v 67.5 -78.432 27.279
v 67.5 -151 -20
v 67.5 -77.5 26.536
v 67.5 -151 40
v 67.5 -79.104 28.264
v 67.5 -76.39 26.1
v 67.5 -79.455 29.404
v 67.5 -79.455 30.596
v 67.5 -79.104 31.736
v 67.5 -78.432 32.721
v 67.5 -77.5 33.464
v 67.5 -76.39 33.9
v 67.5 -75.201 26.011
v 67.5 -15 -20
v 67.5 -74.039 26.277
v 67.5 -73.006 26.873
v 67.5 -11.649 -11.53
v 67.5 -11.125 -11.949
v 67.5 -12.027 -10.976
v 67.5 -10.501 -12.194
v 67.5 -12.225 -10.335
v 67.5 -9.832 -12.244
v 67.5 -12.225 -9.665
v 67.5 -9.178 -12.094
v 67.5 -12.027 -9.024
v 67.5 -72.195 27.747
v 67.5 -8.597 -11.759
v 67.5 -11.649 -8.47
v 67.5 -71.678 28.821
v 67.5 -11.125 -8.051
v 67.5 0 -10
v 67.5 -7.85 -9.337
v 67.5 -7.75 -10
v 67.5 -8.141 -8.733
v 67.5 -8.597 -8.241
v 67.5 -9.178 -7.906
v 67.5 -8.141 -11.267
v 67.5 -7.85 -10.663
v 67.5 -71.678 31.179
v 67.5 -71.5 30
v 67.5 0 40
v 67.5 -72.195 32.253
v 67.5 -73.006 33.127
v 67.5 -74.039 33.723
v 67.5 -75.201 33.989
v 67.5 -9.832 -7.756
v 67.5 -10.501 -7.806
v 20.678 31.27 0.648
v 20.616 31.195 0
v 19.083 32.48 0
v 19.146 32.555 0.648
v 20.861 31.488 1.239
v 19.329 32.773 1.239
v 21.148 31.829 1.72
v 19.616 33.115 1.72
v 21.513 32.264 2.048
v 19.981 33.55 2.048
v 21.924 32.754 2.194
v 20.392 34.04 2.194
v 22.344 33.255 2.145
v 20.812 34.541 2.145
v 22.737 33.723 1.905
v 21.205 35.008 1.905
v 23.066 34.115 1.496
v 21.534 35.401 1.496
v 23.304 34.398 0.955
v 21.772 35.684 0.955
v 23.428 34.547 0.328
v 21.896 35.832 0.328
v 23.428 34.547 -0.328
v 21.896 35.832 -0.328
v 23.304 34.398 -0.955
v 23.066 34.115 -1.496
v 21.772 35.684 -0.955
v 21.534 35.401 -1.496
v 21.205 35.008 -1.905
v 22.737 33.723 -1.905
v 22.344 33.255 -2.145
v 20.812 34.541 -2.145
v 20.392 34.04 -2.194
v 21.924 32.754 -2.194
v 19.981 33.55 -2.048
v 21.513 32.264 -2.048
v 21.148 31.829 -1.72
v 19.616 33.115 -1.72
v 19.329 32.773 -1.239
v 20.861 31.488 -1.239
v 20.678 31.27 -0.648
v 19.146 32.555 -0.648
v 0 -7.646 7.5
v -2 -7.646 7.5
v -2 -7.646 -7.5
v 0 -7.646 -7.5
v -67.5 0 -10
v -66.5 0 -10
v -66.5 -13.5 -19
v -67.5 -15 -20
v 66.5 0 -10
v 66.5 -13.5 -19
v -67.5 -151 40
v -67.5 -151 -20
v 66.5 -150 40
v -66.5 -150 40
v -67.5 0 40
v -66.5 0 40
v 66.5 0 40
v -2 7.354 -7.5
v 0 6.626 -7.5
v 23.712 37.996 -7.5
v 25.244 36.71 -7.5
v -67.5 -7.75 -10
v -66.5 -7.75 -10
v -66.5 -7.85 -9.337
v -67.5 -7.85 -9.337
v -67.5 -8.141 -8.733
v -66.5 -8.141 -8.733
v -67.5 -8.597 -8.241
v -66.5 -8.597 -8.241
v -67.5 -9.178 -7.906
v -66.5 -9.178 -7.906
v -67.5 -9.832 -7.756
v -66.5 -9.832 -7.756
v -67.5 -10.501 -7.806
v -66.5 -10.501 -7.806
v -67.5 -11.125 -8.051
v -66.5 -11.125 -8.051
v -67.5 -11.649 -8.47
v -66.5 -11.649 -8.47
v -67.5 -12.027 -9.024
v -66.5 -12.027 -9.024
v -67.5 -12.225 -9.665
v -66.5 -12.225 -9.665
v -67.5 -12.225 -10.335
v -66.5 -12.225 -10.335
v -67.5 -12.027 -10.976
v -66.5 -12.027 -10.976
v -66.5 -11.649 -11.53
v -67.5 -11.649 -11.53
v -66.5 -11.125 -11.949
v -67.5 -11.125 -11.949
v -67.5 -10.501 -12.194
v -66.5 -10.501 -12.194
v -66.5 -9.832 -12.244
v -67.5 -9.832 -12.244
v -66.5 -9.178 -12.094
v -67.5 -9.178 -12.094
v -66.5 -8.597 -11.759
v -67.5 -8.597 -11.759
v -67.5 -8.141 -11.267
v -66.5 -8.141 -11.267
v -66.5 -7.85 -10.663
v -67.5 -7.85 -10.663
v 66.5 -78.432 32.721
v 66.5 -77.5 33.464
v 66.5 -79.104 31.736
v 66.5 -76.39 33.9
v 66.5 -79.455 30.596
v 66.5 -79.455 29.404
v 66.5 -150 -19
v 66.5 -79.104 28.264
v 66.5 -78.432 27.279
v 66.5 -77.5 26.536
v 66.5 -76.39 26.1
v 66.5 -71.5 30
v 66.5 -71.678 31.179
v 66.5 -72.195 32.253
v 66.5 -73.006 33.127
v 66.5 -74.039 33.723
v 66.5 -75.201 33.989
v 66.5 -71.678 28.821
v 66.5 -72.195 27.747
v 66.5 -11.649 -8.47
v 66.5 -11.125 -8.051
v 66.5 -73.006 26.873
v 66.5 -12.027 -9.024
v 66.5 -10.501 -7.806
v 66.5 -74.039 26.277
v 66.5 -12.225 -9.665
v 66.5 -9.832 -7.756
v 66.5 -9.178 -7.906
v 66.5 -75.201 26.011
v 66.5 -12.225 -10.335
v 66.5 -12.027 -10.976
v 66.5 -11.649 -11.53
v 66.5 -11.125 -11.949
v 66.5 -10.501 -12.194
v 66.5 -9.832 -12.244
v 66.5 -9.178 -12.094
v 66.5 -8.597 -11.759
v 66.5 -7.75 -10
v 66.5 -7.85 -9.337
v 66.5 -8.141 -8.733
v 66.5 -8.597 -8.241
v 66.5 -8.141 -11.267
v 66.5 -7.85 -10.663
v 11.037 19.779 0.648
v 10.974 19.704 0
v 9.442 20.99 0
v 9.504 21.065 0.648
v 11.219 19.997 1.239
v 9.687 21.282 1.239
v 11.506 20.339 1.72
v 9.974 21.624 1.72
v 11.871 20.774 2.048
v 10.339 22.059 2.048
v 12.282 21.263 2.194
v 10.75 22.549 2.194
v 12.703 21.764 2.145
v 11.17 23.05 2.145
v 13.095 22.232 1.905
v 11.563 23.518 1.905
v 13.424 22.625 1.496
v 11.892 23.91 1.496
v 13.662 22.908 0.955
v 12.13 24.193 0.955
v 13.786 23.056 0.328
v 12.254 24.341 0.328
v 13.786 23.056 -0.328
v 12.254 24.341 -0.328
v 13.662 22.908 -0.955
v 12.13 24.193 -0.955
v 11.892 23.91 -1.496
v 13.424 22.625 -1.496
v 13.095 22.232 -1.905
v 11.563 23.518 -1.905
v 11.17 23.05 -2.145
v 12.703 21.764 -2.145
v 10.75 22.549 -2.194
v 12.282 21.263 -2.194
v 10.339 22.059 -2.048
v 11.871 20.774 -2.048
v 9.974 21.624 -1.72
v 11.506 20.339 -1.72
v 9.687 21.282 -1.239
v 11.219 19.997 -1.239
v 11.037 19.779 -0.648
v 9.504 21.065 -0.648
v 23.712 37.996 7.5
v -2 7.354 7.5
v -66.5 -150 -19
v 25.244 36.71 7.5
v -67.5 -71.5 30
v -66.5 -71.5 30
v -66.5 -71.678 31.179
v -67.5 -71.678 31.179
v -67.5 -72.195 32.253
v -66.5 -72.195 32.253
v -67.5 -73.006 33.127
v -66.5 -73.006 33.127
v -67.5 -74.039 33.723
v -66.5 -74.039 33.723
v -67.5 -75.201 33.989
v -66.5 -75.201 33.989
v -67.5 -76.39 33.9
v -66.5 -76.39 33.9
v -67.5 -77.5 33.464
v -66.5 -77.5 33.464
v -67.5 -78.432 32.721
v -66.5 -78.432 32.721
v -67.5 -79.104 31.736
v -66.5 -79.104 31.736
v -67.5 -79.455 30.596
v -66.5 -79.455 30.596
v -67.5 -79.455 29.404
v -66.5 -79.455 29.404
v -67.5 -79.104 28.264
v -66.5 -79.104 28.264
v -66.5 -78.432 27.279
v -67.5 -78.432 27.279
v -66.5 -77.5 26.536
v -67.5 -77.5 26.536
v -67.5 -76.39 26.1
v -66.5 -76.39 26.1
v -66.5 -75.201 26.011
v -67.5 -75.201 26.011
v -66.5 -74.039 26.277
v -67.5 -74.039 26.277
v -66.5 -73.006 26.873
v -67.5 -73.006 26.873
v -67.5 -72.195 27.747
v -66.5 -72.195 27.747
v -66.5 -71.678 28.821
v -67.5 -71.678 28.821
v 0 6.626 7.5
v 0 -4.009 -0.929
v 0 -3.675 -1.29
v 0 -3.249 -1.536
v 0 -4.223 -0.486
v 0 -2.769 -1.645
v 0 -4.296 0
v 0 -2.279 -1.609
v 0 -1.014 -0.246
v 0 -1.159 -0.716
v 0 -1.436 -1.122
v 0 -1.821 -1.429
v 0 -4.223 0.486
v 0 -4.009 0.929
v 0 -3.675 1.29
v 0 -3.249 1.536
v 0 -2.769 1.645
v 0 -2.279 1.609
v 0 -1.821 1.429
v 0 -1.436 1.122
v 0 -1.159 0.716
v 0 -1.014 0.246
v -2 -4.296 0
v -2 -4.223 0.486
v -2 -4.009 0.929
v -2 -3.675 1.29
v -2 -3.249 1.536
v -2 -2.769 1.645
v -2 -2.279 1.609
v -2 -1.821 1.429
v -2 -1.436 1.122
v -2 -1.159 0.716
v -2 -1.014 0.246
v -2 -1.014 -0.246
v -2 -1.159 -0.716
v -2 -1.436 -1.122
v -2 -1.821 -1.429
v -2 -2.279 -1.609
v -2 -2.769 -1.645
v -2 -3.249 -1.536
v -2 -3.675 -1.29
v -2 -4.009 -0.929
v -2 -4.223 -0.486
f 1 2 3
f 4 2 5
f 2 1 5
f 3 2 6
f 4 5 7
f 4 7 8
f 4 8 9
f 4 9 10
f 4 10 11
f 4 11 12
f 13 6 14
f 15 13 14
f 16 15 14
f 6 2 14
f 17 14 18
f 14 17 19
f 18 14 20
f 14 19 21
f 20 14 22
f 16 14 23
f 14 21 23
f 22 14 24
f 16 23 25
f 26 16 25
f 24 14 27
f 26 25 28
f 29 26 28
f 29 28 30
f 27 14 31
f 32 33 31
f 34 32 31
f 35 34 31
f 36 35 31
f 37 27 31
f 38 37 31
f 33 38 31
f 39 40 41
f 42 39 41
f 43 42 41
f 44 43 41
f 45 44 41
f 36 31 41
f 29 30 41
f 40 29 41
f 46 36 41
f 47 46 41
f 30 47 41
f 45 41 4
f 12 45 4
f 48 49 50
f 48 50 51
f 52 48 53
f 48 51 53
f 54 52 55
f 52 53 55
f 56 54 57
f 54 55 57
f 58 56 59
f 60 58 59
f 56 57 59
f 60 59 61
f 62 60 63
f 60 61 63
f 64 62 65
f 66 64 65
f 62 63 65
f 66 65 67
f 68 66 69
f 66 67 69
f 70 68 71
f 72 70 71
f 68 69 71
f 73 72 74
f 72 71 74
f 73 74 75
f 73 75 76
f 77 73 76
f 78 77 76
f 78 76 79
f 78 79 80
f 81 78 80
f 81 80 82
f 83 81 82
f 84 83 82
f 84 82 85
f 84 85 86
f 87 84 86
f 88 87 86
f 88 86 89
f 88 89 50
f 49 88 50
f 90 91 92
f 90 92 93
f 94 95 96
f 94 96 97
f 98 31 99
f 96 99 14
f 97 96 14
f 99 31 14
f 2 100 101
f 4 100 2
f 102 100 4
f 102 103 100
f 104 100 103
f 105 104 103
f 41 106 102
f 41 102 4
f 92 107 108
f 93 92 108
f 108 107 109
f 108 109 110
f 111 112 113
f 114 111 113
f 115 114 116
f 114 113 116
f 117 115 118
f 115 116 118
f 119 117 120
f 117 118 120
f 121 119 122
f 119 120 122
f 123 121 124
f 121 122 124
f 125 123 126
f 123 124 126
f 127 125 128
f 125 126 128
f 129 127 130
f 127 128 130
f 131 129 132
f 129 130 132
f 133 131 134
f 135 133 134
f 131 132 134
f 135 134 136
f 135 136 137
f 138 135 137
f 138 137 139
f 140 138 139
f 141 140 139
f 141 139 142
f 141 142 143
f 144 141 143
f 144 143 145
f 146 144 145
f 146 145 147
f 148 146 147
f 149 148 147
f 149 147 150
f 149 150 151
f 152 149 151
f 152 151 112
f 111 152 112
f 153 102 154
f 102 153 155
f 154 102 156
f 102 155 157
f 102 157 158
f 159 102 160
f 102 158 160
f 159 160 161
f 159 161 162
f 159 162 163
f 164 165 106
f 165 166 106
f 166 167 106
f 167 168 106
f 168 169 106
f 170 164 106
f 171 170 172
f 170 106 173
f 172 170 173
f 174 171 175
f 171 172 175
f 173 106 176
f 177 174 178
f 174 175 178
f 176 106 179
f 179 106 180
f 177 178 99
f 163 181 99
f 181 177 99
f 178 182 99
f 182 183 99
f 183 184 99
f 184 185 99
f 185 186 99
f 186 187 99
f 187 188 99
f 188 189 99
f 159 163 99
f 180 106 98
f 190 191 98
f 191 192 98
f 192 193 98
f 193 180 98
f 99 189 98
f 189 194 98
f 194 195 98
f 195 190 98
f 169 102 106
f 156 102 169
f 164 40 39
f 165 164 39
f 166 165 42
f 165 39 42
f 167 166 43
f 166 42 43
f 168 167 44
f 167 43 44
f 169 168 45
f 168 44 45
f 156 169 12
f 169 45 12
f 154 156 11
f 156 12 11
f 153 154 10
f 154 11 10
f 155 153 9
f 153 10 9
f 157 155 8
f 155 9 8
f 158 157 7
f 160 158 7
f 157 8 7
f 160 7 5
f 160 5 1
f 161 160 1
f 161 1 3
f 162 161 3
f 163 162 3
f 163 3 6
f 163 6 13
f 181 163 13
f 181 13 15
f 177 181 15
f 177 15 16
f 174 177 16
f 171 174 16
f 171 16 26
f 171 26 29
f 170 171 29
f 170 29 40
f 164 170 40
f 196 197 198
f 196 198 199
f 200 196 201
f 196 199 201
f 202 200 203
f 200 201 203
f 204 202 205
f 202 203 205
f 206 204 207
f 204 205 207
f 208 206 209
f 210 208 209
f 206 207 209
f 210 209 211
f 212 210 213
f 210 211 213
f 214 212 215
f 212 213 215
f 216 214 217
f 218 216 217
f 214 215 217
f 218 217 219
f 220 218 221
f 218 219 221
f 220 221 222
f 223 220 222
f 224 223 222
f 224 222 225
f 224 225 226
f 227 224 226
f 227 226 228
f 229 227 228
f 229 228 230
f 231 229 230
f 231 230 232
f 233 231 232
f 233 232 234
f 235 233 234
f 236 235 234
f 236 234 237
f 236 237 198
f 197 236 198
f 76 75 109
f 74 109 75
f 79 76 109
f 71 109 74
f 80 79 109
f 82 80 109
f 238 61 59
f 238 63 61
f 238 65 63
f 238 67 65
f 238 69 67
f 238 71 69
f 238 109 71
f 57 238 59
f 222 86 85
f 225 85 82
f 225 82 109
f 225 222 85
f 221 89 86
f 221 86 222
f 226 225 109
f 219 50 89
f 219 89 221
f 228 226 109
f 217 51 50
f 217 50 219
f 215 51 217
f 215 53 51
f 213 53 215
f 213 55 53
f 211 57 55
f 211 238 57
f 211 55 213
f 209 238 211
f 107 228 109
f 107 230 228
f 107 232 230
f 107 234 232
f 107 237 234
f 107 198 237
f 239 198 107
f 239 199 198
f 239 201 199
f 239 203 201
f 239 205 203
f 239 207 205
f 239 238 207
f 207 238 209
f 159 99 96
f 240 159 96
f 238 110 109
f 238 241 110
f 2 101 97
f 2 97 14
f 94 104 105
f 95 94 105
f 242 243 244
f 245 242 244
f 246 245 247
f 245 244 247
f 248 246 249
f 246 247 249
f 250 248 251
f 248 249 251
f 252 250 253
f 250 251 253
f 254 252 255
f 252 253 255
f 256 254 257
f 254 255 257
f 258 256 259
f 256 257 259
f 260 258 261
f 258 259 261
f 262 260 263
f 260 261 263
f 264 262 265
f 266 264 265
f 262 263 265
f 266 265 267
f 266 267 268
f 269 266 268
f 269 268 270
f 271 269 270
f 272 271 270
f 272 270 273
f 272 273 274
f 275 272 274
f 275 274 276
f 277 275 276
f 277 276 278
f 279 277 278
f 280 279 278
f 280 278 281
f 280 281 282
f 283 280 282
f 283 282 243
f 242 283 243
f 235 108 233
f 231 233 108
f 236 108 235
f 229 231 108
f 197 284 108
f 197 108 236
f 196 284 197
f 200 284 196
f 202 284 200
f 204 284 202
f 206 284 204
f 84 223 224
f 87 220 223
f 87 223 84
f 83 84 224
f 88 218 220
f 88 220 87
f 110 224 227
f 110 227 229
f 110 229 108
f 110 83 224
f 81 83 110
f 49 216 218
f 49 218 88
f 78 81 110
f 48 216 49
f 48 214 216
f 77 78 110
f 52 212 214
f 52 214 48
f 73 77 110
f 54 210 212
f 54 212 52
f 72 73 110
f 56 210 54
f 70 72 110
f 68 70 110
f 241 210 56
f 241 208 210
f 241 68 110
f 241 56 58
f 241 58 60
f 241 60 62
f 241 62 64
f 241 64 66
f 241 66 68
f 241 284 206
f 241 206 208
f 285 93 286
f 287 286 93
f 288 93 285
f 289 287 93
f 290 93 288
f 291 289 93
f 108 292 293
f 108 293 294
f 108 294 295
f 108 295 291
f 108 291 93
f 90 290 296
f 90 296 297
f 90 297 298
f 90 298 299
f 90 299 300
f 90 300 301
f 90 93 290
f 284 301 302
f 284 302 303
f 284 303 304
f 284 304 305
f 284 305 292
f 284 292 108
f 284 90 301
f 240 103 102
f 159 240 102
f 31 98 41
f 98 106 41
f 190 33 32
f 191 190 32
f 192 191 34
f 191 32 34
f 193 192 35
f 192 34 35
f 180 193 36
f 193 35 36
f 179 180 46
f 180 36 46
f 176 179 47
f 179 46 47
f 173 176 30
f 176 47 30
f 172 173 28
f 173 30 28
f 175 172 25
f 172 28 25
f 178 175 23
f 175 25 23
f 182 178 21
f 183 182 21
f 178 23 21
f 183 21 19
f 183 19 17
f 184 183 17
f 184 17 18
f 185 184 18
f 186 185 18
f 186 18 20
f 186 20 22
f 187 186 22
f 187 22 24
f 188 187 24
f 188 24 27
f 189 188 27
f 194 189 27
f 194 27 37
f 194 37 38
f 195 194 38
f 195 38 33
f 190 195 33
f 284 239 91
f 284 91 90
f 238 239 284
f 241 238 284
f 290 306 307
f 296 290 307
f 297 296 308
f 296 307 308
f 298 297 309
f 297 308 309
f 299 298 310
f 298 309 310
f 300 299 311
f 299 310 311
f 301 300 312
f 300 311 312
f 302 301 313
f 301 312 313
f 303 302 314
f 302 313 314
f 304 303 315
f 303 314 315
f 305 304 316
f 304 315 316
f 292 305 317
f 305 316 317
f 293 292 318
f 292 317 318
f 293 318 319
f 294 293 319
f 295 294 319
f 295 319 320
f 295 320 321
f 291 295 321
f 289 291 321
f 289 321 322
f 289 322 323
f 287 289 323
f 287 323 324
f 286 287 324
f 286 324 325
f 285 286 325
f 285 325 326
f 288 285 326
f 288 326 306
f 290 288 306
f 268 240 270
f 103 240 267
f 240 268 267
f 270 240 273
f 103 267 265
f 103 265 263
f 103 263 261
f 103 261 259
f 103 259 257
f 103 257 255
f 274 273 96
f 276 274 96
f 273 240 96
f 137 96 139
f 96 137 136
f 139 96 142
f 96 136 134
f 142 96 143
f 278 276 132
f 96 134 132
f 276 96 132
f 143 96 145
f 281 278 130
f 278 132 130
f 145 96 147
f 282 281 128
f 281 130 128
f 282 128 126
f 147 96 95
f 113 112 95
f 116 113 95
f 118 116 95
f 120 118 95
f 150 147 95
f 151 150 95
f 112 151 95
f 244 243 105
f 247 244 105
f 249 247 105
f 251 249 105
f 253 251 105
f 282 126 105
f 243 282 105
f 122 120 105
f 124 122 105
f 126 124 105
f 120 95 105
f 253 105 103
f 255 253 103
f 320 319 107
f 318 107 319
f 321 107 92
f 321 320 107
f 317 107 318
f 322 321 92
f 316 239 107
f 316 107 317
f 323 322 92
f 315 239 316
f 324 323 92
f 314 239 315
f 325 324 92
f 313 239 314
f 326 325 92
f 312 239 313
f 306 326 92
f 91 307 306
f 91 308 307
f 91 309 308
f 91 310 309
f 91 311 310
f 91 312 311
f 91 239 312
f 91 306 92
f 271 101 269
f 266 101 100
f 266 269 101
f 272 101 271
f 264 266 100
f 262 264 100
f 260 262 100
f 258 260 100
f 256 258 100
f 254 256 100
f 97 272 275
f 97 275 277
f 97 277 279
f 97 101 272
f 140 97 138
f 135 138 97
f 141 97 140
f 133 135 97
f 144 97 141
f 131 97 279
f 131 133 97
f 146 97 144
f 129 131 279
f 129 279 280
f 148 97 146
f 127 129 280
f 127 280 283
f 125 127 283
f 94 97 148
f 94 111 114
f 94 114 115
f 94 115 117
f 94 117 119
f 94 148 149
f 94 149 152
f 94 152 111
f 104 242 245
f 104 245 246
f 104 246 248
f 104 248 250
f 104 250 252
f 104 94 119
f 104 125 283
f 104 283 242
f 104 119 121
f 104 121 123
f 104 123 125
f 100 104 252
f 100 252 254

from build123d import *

# Parameters (mm, degrees)
F1_DEPTH  = 150
F2_W      = 135
F2_H      = 60
F3_DEPTH  = 1
F5_D      = 4.5
F7_D      = 8
F9_DEPTH  = 7.5
F11_D     = 3.3
F13_D     = 4.4
F15_DEPTH = 140


with BuildPart() as f1:
    # F0 (on Front) → F1 (new body)
    with BuildSketch(Plane.XZ):
        Polygon((-67.5, -20), (67.5, -20), (67.5, 40), (66.5, 40), (66.5, -19), (-66.5, -19), (-66.5, 40), (-67.5, 40), align=None)
    extrude(amount=F1_DEPTH)

    # F2 (on face) → F3 (join)
    with BuildSketch(Plane.XZ.offset(150)):
        with Locations((0, 10)):
            Rectangle(F2_W, F2_H)
    extrude(amount=F3_DEPTH)

    # F5 (through all)
    with Locations(Plane(origin=(-67.5, 0, 0), x_dir=(0, -1, 0), z_dir=(-1, 0, 0))):
        with Locations((10, -10)):
            Hole(F5_D / 2)

    # F7 (through all)
    with Locations(Plane(origin=(-67.5, 0, 0), x_dir=(0, -1, 0), z_dir=(-1, 0, 0))):
        with Locations((75.5, 30)):
            Hole(F7_D / 2)

    # F14 (on face) → F15 (cut)
    with BuildSketch(Plane.YZ.offset(67.5)):
        Polygon((0, -10), (-15, -20), (0, -20), align=None)
    extrude(amount=-F15_DEPTH, mode=Mode.SUBTRACT)


with BuildPart() as f9:
    # F8 (on Top) → F9 (new body, symmetric)
    with BuildSketch(Plane.XY):
        Polygon((-2, 7.3540675081), (-2, -7.6459324919), (0, -7.6459324919), (0, 6.6261270396), (25.2435932737, 36.7102700135), (23.7115043875, 37.9958452329), align=None)
    extrude(amount=F9_DEPTH, both=True)

    # F11 (through all)
    with Locations(Plane.YZ):
        with Locations((-2.6459324919, 0)):
            Hole(F11_D / 2)

    # F13 (through all)
    with Locations(Plane(origin=(-3.2627306405, 2.7377560771, 0), x_dir=(0.6427876097, 0.7660444431, 0), z_dir=(0.7660444431, -0.6427876097, 0))):
        with Locations((24.3479673296, 0), (39.3479673296, 0)):
            Hole(F13_D / 2)


solid = Compound([f1.part, f9.part])
